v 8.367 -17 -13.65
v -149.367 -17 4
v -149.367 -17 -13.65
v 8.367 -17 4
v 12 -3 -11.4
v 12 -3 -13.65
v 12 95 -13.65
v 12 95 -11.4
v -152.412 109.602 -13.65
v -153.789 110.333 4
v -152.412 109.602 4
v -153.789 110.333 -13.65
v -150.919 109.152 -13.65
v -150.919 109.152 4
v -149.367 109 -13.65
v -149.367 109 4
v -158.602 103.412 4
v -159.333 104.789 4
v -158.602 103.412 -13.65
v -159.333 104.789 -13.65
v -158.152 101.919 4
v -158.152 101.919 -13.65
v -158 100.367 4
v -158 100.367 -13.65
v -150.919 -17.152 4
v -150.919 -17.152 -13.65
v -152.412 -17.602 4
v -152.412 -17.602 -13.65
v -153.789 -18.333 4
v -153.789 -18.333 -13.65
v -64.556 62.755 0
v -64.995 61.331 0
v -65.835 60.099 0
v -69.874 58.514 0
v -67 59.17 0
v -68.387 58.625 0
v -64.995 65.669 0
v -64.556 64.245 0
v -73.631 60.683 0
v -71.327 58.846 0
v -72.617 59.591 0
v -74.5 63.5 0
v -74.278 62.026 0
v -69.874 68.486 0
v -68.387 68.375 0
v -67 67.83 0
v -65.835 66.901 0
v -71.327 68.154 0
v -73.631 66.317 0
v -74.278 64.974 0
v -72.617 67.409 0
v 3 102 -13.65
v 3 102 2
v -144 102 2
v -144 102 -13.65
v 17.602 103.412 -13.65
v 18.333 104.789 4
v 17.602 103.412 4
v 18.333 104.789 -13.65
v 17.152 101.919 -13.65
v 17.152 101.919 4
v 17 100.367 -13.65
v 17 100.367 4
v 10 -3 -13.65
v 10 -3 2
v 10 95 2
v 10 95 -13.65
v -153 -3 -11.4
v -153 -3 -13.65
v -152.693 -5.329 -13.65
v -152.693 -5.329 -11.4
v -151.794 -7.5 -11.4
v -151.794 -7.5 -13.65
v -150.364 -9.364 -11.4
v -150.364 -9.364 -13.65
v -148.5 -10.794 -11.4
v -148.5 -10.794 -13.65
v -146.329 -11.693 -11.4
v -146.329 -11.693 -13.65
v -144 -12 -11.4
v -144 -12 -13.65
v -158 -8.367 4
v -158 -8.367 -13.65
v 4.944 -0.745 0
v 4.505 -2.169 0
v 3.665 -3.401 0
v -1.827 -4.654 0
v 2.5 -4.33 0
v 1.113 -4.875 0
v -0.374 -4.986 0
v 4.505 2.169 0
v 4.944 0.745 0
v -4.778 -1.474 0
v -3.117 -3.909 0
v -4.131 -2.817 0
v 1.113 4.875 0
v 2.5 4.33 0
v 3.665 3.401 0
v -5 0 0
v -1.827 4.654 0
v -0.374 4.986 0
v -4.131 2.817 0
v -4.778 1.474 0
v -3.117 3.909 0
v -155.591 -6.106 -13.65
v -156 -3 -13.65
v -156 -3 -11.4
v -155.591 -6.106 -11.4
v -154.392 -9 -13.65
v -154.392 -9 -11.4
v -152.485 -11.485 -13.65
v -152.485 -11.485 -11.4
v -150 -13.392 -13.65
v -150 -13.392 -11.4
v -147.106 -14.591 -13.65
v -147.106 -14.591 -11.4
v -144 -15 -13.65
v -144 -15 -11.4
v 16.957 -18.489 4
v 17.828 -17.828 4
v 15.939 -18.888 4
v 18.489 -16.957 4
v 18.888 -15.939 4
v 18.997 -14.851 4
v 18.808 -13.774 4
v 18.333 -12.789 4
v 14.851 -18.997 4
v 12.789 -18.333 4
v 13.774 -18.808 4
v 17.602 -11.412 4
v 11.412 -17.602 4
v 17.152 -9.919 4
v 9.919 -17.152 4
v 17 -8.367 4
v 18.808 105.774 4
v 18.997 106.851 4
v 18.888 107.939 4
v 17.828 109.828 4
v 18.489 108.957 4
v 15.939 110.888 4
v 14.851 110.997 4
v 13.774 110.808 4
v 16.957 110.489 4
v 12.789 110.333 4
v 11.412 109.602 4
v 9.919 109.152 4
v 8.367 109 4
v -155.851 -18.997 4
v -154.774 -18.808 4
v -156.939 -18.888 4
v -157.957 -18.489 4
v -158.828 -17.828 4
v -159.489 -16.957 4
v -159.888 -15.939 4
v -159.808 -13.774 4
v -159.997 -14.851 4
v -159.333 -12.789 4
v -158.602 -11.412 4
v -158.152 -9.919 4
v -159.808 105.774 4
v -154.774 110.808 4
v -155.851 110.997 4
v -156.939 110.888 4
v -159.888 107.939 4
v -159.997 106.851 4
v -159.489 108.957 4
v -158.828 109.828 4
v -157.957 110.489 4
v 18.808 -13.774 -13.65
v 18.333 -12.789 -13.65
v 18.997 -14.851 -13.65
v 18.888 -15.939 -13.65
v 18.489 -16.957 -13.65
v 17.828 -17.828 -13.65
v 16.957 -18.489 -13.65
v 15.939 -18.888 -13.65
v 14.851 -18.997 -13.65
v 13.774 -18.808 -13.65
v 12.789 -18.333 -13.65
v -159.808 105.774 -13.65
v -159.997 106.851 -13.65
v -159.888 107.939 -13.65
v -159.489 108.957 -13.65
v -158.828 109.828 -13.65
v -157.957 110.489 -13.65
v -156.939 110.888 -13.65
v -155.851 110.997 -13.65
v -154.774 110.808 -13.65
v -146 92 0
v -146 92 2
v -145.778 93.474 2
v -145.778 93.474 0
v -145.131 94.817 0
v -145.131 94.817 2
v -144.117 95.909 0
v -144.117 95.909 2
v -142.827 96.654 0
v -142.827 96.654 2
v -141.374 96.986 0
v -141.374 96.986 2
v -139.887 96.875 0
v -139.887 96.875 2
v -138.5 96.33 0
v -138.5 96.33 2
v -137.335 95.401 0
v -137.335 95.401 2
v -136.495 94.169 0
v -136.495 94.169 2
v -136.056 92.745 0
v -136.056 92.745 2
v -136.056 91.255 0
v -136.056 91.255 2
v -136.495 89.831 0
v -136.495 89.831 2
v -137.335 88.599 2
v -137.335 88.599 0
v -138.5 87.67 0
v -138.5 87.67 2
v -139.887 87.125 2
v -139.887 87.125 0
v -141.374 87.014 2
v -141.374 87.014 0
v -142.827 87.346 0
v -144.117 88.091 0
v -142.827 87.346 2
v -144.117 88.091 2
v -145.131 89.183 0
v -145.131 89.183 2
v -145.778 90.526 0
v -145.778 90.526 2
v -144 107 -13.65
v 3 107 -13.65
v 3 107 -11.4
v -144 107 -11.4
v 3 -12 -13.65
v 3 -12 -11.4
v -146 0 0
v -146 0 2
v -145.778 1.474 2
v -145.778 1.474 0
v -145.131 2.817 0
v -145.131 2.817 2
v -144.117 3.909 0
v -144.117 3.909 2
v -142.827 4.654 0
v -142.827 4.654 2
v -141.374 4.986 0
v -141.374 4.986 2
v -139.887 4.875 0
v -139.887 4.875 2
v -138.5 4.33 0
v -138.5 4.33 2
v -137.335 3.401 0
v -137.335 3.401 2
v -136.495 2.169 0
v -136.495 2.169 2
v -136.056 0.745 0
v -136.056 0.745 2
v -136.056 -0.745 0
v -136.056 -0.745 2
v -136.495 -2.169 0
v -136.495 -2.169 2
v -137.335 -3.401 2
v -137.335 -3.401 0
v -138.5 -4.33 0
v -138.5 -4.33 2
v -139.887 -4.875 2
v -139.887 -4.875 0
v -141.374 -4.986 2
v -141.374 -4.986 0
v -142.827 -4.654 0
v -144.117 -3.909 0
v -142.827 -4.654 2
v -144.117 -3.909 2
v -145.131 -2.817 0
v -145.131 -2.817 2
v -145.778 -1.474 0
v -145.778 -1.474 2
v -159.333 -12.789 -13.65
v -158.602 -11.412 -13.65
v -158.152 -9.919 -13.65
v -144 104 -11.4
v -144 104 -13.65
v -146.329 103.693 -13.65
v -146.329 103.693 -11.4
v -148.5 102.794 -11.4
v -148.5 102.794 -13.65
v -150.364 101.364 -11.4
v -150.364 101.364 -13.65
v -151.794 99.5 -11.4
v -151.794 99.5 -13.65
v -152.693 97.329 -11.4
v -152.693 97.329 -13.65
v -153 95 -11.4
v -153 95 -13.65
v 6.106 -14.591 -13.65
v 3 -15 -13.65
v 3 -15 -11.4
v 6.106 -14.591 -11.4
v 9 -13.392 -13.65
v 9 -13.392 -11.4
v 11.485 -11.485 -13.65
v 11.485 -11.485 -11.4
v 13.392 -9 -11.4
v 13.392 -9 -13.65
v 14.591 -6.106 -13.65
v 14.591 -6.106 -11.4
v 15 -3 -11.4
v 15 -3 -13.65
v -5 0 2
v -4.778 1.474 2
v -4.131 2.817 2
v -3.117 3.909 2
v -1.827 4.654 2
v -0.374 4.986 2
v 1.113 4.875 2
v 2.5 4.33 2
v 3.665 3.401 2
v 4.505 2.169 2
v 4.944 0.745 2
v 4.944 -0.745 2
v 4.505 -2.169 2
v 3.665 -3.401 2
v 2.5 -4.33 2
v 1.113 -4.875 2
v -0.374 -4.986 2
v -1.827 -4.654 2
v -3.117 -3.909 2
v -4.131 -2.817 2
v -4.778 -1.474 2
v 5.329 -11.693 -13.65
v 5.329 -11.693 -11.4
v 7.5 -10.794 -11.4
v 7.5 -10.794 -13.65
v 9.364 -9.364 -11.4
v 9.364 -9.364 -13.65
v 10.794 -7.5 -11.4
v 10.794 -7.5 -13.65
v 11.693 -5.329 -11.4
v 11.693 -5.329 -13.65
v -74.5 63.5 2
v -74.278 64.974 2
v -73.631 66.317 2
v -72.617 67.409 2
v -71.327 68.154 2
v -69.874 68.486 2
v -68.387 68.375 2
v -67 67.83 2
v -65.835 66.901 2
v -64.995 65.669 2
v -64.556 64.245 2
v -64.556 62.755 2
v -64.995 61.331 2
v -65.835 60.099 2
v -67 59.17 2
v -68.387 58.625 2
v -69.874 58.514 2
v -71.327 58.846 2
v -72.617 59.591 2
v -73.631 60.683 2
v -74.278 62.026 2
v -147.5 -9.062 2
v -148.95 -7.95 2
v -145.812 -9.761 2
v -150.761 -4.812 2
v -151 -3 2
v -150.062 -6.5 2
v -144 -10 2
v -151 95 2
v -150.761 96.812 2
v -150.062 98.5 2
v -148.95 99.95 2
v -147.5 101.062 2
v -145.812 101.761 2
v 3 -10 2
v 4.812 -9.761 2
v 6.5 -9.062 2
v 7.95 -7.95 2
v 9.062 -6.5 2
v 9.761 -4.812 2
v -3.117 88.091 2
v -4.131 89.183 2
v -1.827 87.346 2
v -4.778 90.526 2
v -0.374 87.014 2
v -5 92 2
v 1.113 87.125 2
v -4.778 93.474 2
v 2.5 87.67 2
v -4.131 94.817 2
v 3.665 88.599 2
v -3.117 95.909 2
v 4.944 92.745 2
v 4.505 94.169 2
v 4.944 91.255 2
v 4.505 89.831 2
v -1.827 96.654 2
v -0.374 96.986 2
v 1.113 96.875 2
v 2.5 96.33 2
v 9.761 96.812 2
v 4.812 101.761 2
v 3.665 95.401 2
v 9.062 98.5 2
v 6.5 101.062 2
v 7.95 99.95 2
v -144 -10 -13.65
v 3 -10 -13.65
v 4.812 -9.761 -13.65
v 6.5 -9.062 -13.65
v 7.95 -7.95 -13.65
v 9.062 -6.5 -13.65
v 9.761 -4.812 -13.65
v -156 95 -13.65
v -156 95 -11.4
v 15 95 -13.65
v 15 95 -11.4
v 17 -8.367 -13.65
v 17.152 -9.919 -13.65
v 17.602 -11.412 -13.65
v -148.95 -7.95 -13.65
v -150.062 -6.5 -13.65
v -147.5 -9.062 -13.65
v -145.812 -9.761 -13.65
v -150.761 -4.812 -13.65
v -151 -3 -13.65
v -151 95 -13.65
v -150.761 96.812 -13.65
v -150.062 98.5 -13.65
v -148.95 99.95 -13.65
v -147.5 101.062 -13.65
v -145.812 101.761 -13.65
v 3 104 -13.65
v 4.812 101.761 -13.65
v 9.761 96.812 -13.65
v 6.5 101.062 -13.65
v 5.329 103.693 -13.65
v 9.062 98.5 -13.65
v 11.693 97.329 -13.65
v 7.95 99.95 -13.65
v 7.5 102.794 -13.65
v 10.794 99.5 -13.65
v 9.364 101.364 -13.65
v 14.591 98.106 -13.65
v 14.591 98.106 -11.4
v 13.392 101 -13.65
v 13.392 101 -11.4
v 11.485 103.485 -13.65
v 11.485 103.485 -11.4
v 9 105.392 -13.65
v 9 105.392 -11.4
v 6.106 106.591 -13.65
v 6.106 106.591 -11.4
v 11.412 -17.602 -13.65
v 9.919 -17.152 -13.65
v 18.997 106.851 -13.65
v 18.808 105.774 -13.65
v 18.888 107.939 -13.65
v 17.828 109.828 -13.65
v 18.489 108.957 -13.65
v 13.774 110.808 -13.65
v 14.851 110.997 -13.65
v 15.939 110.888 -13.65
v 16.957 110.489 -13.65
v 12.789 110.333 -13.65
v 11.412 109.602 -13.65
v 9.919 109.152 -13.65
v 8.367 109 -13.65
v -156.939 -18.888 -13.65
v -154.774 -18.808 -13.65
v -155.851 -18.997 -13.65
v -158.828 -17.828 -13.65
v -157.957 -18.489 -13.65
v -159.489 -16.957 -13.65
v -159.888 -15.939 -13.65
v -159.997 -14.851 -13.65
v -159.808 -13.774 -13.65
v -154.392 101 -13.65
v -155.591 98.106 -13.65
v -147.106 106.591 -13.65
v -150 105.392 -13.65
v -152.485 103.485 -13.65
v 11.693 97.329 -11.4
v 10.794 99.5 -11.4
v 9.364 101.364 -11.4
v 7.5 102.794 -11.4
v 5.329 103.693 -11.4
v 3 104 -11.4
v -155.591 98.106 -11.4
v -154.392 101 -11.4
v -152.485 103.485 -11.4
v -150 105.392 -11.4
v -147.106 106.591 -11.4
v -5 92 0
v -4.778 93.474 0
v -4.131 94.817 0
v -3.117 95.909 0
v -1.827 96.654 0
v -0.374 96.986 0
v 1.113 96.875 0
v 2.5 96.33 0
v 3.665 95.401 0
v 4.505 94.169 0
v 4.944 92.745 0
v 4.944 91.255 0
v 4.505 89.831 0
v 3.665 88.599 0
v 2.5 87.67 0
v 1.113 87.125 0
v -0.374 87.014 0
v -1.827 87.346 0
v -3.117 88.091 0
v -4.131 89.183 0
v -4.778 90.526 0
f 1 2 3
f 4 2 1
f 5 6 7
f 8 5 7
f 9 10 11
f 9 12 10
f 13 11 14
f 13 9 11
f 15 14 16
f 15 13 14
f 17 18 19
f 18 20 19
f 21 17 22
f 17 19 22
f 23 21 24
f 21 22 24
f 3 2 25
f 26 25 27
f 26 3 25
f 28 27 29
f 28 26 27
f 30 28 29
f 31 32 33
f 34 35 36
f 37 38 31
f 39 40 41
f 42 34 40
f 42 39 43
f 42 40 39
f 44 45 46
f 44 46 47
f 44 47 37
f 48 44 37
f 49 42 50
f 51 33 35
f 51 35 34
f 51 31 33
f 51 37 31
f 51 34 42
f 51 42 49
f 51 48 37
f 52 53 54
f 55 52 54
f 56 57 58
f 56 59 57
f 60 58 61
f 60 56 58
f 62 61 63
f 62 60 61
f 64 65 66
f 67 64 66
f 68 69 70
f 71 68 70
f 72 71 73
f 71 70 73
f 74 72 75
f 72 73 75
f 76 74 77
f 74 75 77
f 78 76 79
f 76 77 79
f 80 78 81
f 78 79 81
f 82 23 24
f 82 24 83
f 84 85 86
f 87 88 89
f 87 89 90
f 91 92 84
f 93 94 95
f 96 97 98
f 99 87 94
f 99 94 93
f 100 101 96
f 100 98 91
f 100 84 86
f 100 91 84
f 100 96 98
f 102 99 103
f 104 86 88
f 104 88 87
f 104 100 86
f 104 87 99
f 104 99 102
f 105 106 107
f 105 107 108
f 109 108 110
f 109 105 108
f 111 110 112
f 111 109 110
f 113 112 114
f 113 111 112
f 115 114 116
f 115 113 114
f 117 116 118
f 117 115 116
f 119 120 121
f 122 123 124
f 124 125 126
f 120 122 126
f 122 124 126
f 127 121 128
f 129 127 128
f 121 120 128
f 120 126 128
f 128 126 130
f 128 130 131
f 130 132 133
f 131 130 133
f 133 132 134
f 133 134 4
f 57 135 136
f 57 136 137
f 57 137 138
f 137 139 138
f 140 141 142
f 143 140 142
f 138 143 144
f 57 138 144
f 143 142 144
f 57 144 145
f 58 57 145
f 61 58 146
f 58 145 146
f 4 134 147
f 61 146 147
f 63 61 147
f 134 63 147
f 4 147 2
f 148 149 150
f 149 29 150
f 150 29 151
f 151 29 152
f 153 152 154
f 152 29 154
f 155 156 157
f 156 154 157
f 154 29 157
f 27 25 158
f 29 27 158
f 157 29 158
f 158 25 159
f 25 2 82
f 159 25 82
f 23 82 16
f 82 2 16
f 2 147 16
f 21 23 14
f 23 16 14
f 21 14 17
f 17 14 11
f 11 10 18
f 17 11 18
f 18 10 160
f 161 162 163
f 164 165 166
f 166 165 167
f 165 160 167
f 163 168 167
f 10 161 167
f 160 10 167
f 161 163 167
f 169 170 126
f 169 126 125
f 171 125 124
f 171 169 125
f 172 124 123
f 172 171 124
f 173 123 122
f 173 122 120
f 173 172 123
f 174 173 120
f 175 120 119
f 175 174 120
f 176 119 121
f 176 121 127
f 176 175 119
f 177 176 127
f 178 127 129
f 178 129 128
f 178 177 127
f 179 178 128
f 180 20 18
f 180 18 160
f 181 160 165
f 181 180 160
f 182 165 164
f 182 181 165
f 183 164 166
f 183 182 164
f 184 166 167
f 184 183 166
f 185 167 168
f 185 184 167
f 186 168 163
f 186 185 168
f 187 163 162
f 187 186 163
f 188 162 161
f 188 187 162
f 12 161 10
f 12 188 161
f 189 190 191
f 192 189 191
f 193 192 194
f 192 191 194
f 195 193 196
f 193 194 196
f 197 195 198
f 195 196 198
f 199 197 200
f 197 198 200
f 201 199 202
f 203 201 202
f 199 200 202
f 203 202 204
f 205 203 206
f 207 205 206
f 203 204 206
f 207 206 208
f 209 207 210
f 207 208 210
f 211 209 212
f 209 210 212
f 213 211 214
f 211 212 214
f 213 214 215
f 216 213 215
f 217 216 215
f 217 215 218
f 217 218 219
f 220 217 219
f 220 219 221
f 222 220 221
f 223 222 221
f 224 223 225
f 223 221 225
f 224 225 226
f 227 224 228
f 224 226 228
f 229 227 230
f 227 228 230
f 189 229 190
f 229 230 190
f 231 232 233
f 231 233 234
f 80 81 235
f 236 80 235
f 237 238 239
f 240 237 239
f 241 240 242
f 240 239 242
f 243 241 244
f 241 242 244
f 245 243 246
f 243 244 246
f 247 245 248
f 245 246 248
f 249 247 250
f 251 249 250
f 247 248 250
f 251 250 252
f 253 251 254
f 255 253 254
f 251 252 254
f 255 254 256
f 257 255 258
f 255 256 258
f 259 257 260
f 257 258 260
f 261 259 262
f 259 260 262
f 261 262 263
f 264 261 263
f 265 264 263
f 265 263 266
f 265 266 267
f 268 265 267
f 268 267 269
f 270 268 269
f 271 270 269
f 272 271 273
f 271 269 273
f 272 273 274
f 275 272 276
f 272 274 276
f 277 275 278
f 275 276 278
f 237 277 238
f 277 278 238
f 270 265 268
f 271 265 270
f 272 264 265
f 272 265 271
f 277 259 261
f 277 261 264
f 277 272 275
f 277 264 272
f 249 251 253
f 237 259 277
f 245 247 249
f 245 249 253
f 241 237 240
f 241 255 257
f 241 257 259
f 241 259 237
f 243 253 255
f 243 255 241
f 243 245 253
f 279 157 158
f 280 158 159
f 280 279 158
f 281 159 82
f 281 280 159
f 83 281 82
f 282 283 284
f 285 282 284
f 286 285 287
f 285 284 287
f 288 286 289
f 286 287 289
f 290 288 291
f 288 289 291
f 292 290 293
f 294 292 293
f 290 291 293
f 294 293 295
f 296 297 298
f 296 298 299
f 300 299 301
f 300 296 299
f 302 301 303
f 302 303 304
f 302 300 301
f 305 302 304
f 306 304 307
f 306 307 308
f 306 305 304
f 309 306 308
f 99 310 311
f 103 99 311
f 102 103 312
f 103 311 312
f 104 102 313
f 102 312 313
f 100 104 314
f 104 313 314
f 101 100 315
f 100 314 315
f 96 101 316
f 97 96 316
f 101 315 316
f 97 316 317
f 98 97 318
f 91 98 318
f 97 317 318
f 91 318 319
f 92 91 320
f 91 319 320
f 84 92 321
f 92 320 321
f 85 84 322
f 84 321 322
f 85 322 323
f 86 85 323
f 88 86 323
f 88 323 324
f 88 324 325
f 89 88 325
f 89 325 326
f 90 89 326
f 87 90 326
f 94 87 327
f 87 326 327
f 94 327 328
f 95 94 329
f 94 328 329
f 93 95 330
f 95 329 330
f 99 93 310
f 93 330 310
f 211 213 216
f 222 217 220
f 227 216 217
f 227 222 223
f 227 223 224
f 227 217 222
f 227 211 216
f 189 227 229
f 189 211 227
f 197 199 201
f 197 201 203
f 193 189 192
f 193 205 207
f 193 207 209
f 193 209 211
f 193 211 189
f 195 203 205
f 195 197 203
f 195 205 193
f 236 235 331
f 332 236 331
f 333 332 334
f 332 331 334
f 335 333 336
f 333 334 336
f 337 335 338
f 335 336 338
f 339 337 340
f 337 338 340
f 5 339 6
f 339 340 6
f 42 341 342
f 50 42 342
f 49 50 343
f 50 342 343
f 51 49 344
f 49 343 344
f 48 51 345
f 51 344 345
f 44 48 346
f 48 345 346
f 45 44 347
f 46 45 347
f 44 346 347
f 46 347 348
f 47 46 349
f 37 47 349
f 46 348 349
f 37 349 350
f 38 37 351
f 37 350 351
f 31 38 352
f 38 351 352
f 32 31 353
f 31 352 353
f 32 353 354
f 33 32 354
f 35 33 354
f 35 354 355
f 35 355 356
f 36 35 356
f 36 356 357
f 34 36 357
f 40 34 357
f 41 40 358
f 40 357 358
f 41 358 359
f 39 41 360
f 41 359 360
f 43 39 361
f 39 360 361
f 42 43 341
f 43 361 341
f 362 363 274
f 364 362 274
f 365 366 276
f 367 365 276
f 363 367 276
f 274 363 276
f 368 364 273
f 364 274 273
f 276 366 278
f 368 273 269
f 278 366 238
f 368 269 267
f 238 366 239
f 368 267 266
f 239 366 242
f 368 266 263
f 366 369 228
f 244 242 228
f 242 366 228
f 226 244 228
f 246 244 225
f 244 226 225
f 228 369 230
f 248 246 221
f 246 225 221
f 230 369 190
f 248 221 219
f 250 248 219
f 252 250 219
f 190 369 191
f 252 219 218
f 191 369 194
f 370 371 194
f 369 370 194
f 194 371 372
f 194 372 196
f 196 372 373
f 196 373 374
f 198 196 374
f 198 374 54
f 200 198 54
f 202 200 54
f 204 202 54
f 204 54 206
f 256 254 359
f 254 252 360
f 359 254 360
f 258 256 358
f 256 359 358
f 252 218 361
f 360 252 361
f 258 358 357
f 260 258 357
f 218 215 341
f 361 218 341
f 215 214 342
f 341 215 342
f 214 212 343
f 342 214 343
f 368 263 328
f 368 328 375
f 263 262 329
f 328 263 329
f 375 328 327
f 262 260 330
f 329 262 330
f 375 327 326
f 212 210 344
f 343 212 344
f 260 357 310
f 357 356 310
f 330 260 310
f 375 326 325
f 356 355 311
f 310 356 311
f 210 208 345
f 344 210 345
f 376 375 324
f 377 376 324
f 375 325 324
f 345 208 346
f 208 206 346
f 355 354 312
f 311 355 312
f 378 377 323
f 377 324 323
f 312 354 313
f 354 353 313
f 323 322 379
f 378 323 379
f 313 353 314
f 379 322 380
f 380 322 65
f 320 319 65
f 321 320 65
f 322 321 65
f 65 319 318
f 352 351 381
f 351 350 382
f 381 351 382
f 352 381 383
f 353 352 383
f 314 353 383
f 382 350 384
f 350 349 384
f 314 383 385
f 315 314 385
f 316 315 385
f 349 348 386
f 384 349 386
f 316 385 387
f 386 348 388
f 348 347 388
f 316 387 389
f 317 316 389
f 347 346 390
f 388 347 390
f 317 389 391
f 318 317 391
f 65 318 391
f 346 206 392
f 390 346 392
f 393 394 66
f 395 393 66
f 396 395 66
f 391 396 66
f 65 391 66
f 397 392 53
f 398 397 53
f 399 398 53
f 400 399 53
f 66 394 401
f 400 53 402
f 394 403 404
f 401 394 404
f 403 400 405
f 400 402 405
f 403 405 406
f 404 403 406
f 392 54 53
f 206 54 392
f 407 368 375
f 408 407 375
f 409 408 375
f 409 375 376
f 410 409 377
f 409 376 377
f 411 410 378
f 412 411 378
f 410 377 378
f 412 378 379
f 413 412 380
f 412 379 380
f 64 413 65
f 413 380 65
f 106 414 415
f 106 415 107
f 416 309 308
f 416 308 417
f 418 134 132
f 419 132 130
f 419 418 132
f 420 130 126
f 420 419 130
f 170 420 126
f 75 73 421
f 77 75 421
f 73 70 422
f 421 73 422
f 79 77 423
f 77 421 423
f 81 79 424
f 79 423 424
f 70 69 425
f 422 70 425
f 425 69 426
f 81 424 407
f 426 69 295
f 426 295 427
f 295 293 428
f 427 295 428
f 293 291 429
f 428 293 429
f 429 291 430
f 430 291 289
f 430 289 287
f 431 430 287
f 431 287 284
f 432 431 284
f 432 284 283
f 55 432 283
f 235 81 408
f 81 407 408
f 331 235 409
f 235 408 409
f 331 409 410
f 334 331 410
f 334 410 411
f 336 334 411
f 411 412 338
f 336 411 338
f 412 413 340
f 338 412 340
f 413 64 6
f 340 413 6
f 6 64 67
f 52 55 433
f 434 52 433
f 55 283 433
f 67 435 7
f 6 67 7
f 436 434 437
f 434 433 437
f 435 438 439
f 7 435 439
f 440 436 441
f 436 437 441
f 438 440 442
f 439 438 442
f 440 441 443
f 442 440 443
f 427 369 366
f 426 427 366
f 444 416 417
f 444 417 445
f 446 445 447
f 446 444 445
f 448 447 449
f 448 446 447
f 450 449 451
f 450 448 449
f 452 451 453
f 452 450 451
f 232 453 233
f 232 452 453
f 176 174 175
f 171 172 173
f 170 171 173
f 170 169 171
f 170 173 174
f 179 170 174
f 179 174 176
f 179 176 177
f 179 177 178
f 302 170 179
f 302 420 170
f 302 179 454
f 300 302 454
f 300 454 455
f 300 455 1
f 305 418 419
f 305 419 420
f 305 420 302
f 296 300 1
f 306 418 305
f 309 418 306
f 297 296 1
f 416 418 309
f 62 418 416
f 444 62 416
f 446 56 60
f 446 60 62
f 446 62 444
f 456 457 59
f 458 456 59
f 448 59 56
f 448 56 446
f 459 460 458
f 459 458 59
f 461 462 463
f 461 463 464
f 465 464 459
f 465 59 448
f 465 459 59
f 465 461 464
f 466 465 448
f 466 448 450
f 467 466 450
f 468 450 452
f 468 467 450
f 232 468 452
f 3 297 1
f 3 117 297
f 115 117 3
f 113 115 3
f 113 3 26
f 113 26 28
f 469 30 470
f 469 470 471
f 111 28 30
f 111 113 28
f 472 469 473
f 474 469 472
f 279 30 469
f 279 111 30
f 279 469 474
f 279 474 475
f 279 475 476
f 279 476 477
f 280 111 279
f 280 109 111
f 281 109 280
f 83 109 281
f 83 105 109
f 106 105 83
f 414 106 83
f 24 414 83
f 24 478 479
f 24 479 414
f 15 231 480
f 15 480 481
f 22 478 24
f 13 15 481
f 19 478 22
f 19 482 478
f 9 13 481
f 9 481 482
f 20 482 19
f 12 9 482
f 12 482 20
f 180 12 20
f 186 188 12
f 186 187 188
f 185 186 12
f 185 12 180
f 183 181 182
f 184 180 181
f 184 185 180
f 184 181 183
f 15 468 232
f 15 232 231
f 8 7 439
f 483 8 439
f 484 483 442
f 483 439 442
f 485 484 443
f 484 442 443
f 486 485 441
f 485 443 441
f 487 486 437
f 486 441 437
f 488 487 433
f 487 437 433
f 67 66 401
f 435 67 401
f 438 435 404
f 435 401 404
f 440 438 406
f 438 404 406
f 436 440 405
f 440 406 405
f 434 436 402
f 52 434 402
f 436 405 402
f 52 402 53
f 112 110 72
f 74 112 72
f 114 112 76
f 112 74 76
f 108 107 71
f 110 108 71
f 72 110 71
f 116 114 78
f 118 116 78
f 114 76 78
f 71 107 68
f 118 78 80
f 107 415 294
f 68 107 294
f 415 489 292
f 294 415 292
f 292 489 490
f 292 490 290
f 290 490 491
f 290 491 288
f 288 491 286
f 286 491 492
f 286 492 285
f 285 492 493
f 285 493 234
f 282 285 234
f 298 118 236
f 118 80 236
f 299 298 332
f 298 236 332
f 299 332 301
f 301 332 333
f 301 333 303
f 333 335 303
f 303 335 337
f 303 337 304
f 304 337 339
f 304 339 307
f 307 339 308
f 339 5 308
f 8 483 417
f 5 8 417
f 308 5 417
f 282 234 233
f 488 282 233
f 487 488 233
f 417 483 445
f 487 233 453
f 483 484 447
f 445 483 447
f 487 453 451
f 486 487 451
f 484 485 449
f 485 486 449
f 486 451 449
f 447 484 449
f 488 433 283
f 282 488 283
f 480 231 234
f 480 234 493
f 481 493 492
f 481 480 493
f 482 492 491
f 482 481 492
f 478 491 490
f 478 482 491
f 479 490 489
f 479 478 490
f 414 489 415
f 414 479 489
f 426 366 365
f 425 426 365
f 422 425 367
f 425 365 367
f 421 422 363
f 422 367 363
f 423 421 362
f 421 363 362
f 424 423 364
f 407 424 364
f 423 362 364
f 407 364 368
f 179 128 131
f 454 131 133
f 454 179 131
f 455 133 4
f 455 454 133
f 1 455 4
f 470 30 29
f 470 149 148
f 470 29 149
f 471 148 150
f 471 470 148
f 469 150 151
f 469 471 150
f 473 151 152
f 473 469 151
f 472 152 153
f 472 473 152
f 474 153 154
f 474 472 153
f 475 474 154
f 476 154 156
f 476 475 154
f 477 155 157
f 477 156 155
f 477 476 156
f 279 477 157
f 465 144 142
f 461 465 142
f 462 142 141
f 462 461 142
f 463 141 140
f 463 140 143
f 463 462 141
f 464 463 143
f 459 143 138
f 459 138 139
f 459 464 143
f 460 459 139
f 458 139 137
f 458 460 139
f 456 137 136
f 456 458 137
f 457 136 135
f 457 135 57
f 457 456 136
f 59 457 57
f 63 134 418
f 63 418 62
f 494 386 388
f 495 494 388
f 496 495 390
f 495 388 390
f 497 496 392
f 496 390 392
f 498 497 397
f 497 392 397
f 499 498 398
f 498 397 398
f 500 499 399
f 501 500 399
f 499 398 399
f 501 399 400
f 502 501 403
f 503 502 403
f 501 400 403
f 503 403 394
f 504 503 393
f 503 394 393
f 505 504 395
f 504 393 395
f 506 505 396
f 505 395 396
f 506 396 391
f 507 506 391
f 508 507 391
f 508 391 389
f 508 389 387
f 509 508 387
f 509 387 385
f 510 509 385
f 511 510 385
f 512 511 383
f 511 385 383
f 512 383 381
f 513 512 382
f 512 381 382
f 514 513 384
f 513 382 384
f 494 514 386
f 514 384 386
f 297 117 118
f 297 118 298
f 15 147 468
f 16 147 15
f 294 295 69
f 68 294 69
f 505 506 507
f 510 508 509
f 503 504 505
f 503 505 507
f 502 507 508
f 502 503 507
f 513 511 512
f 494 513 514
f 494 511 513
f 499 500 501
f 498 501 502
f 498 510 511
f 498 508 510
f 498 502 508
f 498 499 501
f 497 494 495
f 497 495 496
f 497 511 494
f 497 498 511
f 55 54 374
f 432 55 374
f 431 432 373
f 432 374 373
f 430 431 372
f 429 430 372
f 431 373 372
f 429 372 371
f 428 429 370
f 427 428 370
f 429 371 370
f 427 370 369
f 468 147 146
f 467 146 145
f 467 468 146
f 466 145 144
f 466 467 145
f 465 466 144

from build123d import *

# Parameters (mm, degrees)
BOSS_EXTRUDE1_START     = 2
SKETCH1_W               = 175
SKETCH1_H               = 126
BOSS_EXTRUDE1_DEPTH     = 2
SKETCH2_R               = 5
BOSS_EXTRUDE2_DEPTH     = 2
FILLET1_R               = 2
BOSS_EXTRUDE3_DEPTH     = 15.65
CUT_EXTRUDE_THIN1_DEPTH = 2.25
SKETCH8_R               = 4
BOSS_EXTRUDE4_DEPTH     = 17.65
FILLET2_R               = 8


with BuildPart() as part:
    # Sketch1 → Boss-Extrude1 (new body)
    with BuildSketch(Plane.XY.offset(BOSS_EXTRUDE1_START)):
        with Locations((-70.5, 46)):
            Rectangle(SKETCH1_W, SKETCH1_H)
    extrude(amount=BOSS_EXTRUDE1_DEPTH)

    # Sketch2 → Boss-Extrude2 (add)
    with BuildSketch(Plane(origin=(0, 0, 2), x_dir=(-1, 0, 0), z_dir=(0, 0, -1))):
        Circle(SKETCH2_R)
        with Locations((69.5, 63.5)):
            Circle(SKETCH2_R)
        with Locations((0, 92)):
            Circle(SKETCH2_R)
        with Locations((141, 92)):
            Circle(SKETCH2_R)
        with Locations((141, 0)):
            Circle(SKETCH2_R)
    extrude(amount=BOSS_EXTRUDE2_DEPTH)

    # Fillet1
    fillet1_edges = [part.edges().sort_by_distance(p)[0] for p in [
        (-158, 109, 3),
        (17, 109, 3),
        (17, -17, 3),
        (-158, -17, 3),
    ]]
    fillet(fillet1_edges, radius=FILLET1_R)

    # Sketch3 → Boss-Extrude3 (add)
    with BuildSketch(Plane(origin=(0, 0, 2), x_dir=(-1, 0, 0), z_dir=(0, 0, -1))):
        with BuildLine():
            Line((-15, 109), (156, 109))
            ThreePointArc((156, 109), (157.414213562, 108.414213562), (158, 107))
            Line((158, 107), (158, -15))
            ThreePointArc((158, -15), (157.414213562, -16.414213562), (156, -17))
            Line((156, -17), (-15, -17))
            ThreePointArc((-15, -17), (-16.414213562, -16.414213562), (-17, -15))
            Line((-17, -15), (-17, 107))
            ThreePointArc((-17, 107), (-16.414213562, 108.414213562), (-15, 109))
        make_face()
        with BuildLine():
            Line((-3, 102), (144, 102))
            ThreePointArc((144, 102), (148.949747468, 99.949747468), (151, 95))
            Line((151, 95), (151, -3))
            ThreePointArc((151, -3), (148.949747468, -7.949747468), (144, -10))
            Line((144, -10), (-3, -10))
            ThreePointArc((-3, -10), (-7.949747468, -7.949747468), (-10, -3))
            Line((-10, -3), (-10, 95))
            ThreePointArc((-10, 95), (-7.949747468, 99.949747468), (-3, 102))
        make_face(mode=Mode.SUBTRACT)
    extrude(amount=BOSS_EXTRUDE3_DEPTH)

    # Sketch5 → Cut-Extrude-Thin1 (cut)
    with BuildSketch(Plane(origin=(0, 0, -13.65), x_dir=(-1, 0, 0), z_dir=(0, 0, -1))):
        with BuildLine():
            Line((-3, 107), (144, 107))
            ThreePointArc((144, 107), (152.485281374, 103.485281374), (156, 95))
            Line((156, 95), (156, -3))
            ThreePointArc((156, -3), (152.485281374, -11.485281374), (144, -15))
            Line((144, -15), (-3, -15))
            ThreePointArc((-3, -15), (-11.485281374, -11.485281374), (-15, -3))
            Line((-15, -3), (-15, 95))
            ThreePointArc((-15, 95), (-11.485281374, 103.485281374), (-3, 107))
        make_face()
        with BuildLine():
            Line((-3, 104), (144, 104))
            ThreePointArc((144, 104), (150.363961031, 101.363961031), (153, 95))
            Line((153, 95), (153, -3))
            ThreePointArc((153, -3), (150.363961031, -9.363961031), (144, -12))
            Line((144, -12), (-3, -12))
            ThreePointArc((-3, -12), (-9.363961031, -9.363961031), (-12, -3))
            Line((-12, -3), (-12, 95))
            ThreePointArc((-12, 95), (-9.363961031, 101.363961031), (-3, 104))
        make_face(mode=Mode.SUBTRACT)
    extrude(amount=-CUT_EXTRUDE_THIN1_DEPTH, mode=Mode.SUBTRACT)

    # Sketch8 → Boss-Extrude4 (add)
    with BuildSketch(Plane(origin=(0, 0, -13.65), x_dir=(-1, 0, 0), z_dir=(0, 0, -1))):
        with Locations((156, 107)):
            Circle(SKETCH8_R)
        with Locations((156, -15)):
            Circle(SKETCH8_R)
        with Locations((-15, -15)):
            Circle(SKETCH8_R)
        with Locations((-15, 107)):
            Circle(SKETCH8_R)
    extrude(amount=-BOSS_EXTRUDE4_DEPTH)

    # Fillet2
    fillet2_edges = [part.edges().sort_by_distance(p)[0] for p in [
        (-152.535898385, 109, -4.825),
        (-158, 103.535898385, -4.825),
        (-158, -11.535898385, -4.825),
        (-152.535898385, -17, -4.825),
        (11.535898385, -17, -4.825),
        (17, -11.535898385, -4.825),
        (11.535898385, 109, -4.825),
        (17, 103.535898385, -4.825),
    ]]
    fillet(fillet2_edges, radius=FILLET2_R)


solid = part.part
